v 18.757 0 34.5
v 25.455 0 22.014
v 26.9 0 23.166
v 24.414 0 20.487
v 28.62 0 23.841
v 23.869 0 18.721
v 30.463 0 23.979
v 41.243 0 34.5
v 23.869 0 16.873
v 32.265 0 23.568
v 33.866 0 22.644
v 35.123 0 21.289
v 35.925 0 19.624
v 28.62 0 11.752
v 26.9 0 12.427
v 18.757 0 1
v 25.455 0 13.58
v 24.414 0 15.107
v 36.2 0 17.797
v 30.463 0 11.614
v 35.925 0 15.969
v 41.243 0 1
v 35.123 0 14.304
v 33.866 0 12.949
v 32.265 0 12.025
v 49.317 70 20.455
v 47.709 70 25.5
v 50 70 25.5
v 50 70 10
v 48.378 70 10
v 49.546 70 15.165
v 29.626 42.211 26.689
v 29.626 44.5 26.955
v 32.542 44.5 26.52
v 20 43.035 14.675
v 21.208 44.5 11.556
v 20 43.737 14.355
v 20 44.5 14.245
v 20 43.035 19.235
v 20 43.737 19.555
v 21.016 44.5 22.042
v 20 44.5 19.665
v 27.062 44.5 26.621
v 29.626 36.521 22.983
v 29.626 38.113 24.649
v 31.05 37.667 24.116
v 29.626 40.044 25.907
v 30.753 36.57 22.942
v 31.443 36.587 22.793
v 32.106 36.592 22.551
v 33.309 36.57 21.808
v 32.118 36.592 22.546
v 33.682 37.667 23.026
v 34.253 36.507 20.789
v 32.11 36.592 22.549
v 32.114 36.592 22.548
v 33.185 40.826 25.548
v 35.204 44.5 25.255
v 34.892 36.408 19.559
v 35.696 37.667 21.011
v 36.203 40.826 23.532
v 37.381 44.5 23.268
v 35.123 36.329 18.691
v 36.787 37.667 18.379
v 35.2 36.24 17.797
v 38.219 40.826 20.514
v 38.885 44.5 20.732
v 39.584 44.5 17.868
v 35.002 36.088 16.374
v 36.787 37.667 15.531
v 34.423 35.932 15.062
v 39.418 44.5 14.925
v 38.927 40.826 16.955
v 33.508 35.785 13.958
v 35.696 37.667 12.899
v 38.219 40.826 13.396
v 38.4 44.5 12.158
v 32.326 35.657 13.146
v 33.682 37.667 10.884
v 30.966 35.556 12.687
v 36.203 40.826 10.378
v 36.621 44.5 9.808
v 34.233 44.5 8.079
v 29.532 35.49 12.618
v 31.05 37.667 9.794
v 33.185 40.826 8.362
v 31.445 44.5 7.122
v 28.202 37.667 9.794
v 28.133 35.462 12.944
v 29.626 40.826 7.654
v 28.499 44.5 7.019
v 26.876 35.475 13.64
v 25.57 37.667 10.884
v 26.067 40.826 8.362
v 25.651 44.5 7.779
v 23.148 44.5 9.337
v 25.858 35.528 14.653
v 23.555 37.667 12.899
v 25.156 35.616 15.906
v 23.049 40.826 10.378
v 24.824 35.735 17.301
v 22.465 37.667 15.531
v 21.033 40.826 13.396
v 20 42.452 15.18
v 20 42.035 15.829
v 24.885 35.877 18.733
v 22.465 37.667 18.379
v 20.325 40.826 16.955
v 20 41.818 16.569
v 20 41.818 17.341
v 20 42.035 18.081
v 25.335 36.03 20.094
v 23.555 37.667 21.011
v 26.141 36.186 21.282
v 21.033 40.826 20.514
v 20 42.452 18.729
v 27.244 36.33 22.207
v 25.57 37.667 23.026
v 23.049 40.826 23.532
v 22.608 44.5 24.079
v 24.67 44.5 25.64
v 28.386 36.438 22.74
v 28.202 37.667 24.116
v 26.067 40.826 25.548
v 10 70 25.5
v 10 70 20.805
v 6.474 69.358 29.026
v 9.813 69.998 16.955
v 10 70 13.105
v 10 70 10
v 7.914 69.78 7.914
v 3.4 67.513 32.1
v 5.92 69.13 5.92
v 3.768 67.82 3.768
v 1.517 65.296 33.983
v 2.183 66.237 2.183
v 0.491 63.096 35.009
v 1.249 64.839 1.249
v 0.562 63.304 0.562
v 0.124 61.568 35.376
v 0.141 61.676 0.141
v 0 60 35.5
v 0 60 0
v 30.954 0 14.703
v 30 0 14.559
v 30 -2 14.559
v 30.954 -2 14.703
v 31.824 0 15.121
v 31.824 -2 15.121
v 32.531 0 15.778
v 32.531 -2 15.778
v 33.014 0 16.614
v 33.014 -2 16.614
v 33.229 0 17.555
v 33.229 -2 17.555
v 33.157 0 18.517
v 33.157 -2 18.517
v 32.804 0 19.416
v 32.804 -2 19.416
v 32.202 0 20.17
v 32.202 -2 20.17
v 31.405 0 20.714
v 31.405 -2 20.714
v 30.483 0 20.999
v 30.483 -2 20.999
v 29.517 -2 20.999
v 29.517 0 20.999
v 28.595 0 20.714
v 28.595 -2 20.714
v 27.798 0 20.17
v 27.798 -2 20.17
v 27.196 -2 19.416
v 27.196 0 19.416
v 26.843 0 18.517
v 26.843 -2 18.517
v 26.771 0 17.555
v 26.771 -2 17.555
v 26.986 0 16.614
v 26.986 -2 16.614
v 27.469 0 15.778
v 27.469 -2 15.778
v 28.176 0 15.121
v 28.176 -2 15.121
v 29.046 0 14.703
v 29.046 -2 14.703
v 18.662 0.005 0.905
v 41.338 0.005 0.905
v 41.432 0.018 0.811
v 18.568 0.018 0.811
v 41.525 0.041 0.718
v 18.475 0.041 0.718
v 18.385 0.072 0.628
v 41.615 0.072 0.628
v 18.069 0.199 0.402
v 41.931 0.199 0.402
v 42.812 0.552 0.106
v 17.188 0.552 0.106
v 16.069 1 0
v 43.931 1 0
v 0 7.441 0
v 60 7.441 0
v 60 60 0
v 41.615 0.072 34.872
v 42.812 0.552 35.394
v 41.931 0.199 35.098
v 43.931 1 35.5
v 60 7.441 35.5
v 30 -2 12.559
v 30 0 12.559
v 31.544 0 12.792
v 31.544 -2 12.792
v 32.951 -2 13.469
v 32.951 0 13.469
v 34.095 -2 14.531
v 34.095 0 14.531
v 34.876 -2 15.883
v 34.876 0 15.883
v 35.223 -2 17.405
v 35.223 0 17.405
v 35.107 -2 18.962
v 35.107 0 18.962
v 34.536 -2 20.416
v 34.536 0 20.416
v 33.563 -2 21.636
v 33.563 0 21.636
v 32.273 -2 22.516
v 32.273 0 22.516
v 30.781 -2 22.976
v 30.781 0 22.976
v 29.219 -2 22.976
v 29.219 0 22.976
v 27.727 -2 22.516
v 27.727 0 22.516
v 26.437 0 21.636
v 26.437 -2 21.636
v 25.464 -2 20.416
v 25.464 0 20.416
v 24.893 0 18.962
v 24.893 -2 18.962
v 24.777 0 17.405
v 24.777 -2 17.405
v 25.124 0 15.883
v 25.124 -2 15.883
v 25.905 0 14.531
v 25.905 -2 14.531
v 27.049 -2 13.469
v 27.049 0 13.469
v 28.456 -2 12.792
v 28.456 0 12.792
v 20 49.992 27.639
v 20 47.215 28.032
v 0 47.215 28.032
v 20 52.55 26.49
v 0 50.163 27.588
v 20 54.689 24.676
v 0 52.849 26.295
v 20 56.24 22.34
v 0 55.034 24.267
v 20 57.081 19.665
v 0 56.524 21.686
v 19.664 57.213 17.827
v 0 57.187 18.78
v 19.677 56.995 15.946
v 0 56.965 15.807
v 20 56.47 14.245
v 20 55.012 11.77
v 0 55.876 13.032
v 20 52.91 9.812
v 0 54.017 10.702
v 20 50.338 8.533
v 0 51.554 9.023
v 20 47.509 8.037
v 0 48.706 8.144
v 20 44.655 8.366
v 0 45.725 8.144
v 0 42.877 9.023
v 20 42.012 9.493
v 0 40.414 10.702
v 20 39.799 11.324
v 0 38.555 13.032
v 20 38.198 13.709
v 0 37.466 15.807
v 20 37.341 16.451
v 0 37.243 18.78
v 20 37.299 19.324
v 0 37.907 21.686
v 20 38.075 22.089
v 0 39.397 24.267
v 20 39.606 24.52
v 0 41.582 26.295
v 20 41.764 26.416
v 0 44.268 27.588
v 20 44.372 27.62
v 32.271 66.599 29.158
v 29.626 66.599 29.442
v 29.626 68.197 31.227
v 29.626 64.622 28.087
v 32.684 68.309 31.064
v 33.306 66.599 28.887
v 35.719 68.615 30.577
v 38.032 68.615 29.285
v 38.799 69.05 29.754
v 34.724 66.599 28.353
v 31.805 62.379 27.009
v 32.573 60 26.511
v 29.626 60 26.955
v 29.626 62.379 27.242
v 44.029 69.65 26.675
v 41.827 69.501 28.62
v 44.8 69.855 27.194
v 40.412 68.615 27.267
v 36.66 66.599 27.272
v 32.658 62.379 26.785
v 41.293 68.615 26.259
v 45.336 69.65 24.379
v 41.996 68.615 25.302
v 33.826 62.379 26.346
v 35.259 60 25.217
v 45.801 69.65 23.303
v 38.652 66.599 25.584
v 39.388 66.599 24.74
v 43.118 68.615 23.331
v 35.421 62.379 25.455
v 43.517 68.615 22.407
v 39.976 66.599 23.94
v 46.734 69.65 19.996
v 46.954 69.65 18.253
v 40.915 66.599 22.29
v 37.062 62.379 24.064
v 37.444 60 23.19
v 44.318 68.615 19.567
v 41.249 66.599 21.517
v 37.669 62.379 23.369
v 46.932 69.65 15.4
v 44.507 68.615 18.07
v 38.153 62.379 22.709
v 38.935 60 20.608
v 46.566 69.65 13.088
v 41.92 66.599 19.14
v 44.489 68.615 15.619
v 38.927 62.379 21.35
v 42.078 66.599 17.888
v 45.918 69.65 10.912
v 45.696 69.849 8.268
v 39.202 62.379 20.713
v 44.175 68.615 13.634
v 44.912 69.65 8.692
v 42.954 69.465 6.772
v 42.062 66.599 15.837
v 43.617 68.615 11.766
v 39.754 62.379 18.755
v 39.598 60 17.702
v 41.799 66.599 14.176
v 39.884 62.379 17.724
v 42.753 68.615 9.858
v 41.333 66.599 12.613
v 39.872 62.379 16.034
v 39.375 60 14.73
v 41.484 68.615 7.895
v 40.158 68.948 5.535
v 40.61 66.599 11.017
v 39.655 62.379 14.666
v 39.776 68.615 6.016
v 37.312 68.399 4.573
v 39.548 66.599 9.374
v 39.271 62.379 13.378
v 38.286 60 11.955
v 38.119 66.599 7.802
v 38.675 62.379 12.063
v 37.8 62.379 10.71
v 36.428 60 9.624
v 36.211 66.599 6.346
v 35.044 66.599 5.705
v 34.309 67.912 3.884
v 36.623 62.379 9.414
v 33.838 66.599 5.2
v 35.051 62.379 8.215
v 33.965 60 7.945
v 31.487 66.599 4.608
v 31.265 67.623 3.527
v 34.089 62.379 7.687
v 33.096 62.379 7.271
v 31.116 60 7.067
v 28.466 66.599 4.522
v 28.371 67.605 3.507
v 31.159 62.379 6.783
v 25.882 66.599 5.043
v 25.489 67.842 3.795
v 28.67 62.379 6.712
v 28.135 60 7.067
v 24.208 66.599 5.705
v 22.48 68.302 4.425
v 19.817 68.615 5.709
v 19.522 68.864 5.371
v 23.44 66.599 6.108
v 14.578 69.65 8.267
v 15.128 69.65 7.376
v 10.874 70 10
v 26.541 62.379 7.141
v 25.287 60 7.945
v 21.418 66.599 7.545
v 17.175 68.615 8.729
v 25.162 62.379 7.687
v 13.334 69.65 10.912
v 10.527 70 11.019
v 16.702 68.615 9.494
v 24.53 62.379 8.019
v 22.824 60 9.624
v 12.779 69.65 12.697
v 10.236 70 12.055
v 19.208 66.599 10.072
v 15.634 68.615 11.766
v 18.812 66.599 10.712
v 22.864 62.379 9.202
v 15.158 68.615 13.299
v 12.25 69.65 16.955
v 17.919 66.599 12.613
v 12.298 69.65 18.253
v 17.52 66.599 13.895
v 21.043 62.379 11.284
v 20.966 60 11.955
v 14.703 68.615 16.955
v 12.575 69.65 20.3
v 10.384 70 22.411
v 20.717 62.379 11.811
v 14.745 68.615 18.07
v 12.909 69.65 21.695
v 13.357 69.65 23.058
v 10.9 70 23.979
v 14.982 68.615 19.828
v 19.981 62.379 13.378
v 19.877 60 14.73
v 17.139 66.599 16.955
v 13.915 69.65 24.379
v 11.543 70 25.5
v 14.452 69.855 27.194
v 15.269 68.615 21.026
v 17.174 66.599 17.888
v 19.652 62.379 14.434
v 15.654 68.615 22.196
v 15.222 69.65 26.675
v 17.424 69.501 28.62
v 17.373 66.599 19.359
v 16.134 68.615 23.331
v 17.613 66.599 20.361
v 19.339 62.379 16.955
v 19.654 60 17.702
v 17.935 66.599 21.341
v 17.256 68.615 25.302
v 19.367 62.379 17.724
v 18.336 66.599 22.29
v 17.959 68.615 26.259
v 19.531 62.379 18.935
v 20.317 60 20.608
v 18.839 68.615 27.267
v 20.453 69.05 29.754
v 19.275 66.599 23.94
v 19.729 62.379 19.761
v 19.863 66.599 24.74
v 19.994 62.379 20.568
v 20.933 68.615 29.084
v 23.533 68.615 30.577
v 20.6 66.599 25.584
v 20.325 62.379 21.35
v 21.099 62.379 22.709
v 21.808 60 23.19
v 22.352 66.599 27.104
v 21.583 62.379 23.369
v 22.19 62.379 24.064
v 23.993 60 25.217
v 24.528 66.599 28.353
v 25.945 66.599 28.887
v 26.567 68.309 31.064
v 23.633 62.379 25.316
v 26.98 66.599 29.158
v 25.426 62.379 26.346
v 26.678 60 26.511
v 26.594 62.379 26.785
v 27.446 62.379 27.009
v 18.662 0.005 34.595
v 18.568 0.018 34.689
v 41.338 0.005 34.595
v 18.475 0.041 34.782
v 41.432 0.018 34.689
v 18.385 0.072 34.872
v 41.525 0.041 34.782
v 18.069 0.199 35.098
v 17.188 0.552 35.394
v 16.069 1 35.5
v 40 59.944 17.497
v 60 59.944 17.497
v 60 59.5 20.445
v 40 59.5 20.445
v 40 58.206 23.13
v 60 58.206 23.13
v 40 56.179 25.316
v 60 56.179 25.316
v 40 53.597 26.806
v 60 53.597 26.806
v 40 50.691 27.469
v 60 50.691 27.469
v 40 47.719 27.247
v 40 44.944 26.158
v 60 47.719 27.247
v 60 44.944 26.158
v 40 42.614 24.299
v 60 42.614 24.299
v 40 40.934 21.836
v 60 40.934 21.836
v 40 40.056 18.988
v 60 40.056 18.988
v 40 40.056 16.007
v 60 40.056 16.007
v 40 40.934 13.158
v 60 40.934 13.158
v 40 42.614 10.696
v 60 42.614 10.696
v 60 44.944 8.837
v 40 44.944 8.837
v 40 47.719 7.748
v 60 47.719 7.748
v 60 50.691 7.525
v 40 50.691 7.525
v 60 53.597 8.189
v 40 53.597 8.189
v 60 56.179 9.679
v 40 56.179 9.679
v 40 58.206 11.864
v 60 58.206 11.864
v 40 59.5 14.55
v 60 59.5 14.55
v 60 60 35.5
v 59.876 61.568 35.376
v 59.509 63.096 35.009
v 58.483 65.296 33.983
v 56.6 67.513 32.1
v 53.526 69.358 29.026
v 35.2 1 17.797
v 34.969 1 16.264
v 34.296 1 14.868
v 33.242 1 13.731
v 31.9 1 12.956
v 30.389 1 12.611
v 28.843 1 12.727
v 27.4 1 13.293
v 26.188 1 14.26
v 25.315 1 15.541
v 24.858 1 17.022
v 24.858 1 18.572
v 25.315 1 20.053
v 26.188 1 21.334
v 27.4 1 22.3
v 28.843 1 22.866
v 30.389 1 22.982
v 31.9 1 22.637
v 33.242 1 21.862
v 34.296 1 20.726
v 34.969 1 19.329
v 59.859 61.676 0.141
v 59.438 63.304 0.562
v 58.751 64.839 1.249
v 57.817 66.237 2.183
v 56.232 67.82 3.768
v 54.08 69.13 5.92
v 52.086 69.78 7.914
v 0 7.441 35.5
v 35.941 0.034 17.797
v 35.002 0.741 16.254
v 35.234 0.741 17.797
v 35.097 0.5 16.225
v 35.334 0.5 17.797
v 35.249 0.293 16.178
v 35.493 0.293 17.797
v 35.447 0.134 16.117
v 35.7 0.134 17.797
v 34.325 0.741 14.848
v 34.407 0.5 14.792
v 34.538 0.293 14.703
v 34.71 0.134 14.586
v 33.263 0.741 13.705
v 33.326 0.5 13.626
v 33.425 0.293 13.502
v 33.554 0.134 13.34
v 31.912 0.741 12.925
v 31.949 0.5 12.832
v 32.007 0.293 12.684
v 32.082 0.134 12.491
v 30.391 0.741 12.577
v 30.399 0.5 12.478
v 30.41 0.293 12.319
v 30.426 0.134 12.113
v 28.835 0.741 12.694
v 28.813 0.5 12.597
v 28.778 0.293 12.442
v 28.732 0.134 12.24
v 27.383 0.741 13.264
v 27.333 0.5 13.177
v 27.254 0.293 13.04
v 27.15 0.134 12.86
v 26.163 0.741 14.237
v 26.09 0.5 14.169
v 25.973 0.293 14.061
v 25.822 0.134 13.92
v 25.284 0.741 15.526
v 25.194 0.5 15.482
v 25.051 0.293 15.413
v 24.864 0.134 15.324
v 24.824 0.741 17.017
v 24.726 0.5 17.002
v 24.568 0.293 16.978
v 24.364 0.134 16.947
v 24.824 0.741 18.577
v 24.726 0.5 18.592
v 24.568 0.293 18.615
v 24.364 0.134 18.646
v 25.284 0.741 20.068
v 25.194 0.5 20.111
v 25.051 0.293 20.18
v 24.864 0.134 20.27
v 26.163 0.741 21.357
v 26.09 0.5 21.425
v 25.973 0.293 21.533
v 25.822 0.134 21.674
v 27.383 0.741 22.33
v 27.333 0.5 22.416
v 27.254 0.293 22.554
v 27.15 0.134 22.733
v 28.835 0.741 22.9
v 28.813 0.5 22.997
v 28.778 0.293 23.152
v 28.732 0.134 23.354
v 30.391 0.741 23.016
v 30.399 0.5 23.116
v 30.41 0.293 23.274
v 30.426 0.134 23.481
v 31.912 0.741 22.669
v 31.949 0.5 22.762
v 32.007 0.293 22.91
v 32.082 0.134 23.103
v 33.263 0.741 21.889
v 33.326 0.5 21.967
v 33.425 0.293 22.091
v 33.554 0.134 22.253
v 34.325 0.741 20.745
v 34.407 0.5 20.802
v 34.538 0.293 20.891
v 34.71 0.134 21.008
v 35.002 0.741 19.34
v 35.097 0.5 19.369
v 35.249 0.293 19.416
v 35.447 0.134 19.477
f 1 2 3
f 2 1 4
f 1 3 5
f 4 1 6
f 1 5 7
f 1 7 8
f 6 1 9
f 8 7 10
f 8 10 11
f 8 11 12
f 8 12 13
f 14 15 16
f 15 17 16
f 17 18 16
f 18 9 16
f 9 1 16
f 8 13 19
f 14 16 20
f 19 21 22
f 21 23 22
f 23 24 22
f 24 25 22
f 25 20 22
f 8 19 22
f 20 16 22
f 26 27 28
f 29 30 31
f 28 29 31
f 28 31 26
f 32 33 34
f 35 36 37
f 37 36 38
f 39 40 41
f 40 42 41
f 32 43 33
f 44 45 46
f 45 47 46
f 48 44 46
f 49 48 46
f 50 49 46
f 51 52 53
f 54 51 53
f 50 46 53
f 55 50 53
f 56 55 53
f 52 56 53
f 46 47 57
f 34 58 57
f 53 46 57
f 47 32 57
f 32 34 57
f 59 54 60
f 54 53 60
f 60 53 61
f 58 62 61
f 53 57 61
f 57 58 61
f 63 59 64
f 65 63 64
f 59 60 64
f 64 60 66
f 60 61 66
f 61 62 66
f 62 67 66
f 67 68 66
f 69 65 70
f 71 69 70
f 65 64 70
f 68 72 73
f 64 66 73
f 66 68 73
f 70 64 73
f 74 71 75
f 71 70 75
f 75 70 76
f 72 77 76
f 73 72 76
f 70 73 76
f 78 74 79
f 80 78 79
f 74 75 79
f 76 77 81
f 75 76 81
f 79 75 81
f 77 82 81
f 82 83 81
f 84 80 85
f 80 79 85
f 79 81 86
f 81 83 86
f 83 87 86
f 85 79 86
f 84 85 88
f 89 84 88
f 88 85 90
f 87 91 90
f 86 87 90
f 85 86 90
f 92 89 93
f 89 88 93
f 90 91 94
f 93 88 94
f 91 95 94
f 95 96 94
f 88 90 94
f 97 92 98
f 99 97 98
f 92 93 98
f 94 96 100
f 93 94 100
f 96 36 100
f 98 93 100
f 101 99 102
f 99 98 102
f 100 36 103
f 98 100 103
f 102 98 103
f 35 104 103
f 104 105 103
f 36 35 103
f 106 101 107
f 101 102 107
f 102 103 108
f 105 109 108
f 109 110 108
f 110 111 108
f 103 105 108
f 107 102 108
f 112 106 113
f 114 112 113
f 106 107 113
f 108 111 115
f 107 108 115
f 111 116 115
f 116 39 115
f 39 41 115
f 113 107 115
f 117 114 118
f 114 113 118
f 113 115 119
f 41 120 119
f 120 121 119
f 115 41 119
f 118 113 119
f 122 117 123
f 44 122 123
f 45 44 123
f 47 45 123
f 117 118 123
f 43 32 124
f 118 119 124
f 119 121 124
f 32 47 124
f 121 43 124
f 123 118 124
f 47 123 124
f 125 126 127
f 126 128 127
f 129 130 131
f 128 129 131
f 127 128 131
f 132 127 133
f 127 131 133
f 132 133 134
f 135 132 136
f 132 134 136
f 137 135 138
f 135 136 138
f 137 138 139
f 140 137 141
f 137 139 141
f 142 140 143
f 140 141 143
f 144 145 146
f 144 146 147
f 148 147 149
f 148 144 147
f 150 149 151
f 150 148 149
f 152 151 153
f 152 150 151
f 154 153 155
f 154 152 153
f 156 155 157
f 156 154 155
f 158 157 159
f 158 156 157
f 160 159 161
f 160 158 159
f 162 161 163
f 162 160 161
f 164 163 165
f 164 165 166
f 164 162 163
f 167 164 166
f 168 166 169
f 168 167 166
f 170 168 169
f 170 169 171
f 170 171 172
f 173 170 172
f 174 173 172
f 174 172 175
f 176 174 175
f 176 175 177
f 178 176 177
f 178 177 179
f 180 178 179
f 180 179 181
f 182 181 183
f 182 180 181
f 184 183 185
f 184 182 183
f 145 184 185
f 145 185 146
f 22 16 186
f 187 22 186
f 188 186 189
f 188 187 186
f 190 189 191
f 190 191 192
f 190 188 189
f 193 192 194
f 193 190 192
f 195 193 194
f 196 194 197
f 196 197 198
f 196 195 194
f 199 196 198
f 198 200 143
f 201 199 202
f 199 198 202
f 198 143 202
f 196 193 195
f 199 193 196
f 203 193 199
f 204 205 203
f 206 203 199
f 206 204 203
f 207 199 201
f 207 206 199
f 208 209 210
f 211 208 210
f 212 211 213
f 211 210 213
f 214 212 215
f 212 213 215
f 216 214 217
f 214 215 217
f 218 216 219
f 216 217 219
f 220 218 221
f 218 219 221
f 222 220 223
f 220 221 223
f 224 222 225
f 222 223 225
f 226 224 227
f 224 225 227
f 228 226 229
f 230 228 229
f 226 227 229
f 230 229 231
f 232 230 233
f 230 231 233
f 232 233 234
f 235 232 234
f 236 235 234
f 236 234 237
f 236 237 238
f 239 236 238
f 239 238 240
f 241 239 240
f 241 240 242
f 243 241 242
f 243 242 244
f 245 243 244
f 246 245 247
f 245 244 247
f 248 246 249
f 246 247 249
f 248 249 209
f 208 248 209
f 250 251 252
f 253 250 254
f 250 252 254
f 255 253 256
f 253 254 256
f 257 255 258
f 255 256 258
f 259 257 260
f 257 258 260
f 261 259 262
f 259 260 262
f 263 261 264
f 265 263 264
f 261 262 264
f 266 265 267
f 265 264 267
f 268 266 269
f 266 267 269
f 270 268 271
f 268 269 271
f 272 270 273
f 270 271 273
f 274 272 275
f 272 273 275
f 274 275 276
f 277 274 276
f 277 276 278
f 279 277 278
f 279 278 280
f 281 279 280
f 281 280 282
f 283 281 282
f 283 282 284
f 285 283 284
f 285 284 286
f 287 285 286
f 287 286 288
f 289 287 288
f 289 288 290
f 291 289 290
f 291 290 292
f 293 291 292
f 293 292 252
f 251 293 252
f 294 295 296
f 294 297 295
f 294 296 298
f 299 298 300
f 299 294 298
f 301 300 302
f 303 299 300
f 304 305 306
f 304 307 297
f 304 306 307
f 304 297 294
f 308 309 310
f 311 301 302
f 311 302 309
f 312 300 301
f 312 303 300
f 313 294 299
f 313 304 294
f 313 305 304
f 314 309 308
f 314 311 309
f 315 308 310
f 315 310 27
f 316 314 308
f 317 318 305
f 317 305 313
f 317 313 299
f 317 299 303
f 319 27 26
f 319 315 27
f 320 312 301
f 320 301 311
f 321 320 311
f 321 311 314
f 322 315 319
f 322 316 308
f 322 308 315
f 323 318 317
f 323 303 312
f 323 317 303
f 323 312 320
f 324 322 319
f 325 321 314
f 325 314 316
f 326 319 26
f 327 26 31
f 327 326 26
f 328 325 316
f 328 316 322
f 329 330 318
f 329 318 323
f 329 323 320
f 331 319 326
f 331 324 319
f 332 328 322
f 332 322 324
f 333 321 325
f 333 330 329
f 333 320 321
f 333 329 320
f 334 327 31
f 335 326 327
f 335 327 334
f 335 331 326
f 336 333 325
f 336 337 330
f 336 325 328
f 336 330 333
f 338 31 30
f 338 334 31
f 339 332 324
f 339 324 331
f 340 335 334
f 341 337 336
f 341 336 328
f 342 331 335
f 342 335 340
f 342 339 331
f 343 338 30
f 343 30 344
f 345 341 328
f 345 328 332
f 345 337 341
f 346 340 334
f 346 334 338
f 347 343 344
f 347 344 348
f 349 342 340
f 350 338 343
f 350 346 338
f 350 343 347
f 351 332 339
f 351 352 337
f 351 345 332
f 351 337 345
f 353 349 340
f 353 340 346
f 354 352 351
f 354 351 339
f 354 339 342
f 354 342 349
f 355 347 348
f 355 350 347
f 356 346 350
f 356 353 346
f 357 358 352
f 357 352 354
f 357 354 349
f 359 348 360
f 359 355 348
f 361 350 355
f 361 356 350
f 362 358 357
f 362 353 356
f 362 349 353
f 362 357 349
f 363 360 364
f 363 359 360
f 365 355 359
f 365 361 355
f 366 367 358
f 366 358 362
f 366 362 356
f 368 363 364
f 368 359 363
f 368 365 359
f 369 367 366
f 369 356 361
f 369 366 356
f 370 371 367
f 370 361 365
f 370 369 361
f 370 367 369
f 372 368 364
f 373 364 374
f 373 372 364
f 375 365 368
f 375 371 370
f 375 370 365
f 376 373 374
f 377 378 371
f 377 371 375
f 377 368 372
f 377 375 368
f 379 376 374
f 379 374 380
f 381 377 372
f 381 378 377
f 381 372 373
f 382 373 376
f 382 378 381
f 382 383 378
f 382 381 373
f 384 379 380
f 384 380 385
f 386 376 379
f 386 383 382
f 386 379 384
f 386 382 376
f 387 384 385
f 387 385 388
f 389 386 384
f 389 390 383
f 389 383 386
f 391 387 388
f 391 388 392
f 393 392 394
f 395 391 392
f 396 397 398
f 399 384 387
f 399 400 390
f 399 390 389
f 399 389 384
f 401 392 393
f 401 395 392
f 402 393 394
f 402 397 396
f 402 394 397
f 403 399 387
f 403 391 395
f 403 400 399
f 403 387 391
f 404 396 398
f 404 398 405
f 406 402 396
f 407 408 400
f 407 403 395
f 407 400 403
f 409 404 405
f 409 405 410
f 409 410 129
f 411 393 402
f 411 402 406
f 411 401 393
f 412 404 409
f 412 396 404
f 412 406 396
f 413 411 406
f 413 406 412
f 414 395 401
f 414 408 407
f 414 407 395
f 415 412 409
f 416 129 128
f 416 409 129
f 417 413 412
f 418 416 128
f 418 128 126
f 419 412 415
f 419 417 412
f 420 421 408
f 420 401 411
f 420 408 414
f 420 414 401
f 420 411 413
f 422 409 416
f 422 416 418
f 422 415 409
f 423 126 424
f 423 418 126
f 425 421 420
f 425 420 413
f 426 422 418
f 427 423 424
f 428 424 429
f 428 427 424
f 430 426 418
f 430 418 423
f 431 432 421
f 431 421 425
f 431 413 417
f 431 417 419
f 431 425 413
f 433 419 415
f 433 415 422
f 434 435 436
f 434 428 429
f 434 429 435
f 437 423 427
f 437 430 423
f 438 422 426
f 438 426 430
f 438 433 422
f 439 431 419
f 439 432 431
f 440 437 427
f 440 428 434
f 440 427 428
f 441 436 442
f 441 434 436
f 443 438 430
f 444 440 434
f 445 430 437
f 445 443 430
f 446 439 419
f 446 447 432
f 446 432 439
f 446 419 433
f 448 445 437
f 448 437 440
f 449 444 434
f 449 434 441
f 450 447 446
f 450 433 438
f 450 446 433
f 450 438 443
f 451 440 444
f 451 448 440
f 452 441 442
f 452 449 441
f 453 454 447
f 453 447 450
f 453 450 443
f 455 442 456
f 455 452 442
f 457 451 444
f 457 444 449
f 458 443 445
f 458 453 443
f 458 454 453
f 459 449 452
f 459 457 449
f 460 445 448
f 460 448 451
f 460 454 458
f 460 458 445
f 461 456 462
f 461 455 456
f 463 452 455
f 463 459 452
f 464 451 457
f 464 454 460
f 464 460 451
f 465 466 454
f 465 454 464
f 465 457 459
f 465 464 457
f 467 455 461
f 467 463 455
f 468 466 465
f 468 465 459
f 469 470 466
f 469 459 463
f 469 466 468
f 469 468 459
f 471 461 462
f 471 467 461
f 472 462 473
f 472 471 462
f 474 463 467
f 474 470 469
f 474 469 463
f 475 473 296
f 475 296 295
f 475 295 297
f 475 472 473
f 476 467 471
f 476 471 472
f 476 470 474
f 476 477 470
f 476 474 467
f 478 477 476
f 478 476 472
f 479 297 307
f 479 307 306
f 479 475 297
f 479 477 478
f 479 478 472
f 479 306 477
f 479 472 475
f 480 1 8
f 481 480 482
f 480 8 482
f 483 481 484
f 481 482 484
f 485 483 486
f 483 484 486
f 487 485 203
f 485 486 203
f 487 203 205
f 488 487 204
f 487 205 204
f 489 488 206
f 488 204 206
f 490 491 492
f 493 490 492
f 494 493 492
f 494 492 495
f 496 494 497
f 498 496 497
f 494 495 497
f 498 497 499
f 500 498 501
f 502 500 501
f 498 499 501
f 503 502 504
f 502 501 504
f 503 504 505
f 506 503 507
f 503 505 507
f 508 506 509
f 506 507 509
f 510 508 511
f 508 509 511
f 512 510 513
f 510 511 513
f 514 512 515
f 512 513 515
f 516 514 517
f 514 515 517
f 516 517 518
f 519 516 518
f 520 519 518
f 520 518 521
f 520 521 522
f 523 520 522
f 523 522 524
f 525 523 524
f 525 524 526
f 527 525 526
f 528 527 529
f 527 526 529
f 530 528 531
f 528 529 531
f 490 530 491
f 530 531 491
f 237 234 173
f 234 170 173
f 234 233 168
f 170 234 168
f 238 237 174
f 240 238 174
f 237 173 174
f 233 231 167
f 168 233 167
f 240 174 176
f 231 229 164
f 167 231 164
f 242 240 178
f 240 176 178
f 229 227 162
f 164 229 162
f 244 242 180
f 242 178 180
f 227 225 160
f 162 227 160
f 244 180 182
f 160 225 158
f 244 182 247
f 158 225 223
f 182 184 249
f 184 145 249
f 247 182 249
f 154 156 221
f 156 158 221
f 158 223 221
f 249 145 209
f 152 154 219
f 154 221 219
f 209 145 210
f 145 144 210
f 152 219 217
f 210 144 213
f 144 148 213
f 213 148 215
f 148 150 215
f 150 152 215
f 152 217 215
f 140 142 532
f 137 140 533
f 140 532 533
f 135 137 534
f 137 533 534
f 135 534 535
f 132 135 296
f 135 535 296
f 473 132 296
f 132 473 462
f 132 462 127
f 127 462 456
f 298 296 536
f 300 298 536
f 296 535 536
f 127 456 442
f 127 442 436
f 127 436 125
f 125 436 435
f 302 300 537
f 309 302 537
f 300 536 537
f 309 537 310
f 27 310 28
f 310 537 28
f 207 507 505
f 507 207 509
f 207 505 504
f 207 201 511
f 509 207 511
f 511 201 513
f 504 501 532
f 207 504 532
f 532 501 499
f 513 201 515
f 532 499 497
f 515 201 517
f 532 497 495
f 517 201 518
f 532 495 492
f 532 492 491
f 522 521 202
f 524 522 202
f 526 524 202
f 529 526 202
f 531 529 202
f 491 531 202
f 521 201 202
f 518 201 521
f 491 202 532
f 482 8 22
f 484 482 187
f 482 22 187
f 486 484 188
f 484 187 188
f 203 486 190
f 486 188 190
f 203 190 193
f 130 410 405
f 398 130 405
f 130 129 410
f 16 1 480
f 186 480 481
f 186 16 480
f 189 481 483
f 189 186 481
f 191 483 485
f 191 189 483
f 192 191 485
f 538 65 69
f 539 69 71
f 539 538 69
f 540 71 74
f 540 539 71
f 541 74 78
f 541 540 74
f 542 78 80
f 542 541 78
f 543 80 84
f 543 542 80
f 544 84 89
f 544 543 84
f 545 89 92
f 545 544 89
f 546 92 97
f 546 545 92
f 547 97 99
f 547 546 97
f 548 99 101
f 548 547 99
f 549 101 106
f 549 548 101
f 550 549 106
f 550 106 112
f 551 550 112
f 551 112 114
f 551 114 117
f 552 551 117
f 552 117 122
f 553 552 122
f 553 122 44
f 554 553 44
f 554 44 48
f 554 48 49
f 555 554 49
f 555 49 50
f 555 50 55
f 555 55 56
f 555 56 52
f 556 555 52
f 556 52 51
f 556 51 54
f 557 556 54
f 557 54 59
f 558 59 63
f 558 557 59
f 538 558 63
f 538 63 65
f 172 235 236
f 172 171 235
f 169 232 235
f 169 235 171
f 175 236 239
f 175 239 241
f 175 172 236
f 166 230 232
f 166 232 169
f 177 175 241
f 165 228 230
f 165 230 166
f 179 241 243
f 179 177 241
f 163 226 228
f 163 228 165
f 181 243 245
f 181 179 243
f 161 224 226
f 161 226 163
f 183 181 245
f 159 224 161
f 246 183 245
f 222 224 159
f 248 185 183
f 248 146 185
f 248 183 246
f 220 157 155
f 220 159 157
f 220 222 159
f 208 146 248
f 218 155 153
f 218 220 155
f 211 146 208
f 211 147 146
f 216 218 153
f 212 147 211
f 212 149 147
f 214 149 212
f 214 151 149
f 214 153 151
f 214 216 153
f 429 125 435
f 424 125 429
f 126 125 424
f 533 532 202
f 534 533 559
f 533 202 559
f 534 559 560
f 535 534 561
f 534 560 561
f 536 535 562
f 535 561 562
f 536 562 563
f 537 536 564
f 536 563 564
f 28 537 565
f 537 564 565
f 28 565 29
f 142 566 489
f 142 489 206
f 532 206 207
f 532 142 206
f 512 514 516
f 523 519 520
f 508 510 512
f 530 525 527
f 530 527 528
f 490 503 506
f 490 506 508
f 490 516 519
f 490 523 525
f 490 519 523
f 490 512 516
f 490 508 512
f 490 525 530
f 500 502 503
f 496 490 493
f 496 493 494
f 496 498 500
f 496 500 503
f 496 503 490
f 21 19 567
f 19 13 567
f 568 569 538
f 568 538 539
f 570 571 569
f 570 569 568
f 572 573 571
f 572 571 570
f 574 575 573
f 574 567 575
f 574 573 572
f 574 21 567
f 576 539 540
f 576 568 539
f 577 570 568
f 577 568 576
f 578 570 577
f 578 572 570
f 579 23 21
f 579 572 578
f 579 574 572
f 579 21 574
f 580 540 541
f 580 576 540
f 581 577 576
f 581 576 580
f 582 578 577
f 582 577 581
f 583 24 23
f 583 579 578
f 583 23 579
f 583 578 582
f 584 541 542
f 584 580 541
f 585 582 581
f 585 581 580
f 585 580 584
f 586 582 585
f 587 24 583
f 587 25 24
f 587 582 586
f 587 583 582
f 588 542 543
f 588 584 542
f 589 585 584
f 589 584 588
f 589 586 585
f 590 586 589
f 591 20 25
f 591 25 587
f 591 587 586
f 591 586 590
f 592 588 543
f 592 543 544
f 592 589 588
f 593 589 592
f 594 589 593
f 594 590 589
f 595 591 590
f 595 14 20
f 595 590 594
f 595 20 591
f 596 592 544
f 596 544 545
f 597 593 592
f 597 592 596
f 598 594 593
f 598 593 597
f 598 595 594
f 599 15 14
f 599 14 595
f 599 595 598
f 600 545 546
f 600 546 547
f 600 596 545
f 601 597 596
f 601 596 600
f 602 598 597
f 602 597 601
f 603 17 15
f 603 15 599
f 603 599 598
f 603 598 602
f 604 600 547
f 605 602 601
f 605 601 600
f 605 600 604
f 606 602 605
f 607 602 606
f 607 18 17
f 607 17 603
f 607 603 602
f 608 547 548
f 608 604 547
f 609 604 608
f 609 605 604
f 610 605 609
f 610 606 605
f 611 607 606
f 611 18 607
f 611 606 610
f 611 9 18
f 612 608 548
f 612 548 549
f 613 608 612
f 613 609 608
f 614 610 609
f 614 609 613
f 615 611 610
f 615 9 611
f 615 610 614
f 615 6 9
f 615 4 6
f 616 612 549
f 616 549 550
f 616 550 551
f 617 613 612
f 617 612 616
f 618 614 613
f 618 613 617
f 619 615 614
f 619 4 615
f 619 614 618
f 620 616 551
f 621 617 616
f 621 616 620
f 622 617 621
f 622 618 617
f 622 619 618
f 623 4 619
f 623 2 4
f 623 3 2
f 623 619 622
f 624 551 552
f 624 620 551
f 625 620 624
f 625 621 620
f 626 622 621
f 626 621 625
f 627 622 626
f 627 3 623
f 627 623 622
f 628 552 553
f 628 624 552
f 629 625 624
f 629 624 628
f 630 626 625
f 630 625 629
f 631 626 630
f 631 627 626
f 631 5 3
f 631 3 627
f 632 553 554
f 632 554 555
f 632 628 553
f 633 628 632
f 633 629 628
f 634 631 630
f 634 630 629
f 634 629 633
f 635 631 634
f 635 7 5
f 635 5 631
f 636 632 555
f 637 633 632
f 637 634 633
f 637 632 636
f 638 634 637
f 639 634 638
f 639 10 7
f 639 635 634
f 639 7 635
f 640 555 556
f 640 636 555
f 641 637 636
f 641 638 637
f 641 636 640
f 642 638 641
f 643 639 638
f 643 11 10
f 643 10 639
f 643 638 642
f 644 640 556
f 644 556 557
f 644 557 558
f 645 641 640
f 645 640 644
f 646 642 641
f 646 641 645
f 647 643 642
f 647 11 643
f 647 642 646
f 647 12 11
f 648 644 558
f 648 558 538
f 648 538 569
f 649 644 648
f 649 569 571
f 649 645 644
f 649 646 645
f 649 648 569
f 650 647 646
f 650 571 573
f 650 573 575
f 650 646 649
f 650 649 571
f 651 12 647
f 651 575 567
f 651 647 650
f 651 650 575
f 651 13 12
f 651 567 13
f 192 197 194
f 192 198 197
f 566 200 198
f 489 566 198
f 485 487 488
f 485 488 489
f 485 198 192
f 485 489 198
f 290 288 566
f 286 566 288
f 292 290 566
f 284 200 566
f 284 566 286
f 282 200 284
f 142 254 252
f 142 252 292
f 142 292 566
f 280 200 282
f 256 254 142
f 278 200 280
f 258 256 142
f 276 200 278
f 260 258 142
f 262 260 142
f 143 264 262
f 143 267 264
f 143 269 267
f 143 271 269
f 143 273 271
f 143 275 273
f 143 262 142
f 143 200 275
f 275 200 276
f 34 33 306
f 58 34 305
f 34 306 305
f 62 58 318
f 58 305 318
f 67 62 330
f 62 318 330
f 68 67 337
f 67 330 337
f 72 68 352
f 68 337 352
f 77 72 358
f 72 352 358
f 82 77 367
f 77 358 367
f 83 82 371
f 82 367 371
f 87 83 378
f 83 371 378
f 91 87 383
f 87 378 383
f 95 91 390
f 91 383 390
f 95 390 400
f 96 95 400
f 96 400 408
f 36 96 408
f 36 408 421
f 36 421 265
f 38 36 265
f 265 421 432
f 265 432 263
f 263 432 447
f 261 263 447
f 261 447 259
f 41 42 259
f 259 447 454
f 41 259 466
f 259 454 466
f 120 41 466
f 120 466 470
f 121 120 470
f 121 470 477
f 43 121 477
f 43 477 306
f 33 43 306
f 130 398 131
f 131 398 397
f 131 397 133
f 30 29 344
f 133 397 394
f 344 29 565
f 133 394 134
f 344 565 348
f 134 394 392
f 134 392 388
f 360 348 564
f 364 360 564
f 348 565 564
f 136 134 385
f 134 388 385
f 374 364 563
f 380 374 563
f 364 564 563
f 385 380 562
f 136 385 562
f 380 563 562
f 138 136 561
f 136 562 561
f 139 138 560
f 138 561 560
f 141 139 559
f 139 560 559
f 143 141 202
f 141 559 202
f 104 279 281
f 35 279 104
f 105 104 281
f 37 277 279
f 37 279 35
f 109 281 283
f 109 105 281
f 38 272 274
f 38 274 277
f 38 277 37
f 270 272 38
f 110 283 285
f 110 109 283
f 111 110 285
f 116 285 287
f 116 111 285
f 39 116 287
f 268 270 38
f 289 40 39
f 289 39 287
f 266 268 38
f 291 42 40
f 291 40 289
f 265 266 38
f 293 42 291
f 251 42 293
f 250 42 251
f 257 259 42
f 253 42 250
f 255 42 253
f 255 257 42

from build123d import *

# Parameters (mm, degrees)
SKETCH1_W                                  = 60
SKETCH1_H                                  = 70
BOSS_EXTRUDE1_DEPTH                        = 35.5
SKETCH3_R                                  = 10
CUT_EXTRUDE1_DEPTH                         = 35.5
FILLET1_R                                  = 10
SKETCH6_R                                  = 10
CUT_EXTRUDE6_DEPTH                         = 20
SKETCH7_R                                  = 10
CUT_EXTRUDE7_DEPTH                         = 20
CUT_EXTRUDE_THIN4_DEPTH                    = 99.793977717
CSK_FOR_M5_FLAT_HEAD_MACHINE_SCREW1_OUTL_R = 5.2
CSK_FOR_M5_FLAT_HEAD_MACHINE_SCREW1_DEPTH  = 36.592353538
FILLET2_R                                  = 1
SKETCH14_R                                 = 5.237907484
SKETCH14_R_2                               = 3.237907484
BOSS_EXTRUDE2_DEPTH                        = 2


# Read off the part's stored shape, not the designer's step: CSK for M5 Flat Head Machine Screw1
with BuildPart() as part:
    # Sketch1 → Boss-Extrude1 (new body)
    with BuildSketch(Plane.XY):
        with Locations((30, 35)):
            Rectangle(SKETCH1_W, SKETCH1_H)
    extrude(amount=BOSS_EXTRUDE1_DEPTH)

    # Sketch3 → Cut-Extrude1 (cut)
    with BuildSketch(Plane(origin=(0, 70, 0), x_dir=(1, 0, 0), z_dir=(0, 1, 0))):
        with Locations(Location((29.625863751, -16.954960471, 0), (0, 0, 270))):
            Circle(SKETCH3_R)
    extrude(amount=-CUT_EXTRUDE1_DEPTH, mode=Mode.SUBTRACT)

    # Fillet1
    # the kernel refuses this fillet: 10 mm, written as the material it adds along each edge
    with BuildSketch(Plane(origin=(29.625863751, 34.5, 16.954960471), x_dir=(0, 0, 1), z_dir=(-1, 0, 0))) as fillet1_piece_1:
        with BuildLine():
            CenterArc((10 - FILLET1_R, FILLET1_R), FILLET1_R, 270, 90)
            Line((10 - FILLET1_R, 0), (10, 0))
            Line((10, 0), (10, FILLET1_R))
        make_face()
    revolve(axis=Axis((29.625863751, 34.5, 16.954960471), (0, 1, 0)))
    # the kernel refuses this fillet: 10 mm, written as the material it takes off along each edge
    with BuildSketch(Plane(origin=(85, 70, 35.5), x_dir=(0, -1, 0), z_dir=(-1, 0, 0))) as fillet1_2_piece_1:
        with BuildLine():
            CenterArc((FILLET1_R, -FILLET1_R), FILLET1_R, 90, 90)
            Line((0, -FILLET1_R), (0, 0))
            Line((0, 0), (FILLET1_R, 0))
        make_face()
    extrude(amount=110, mode=Mode.SUBTRACT)
    with BuildSketch(Plane(origin=(29.625863751, 70, 16.954960471), x_dir=(0, 0, 1), z_dir=(-1, 0, 0))) as fillet1_2_piece_2:
        with BuildLine():
            CenterArc((10 + FILLET1_R, -FILLET1_R), FILLET1_R, 90, 90)
            Line((10, -FILLET1_R), (10, 0))
            Line((10, 0), (10 + FILLET1_R, 0))
        make_face()
    revolve(axis=Axis((29.625863751, 70, 16.954960471), (0, 1, 0)), mode=Mode.SUBTRACT)
    with BuildSketch(Plane(origin=(85, 70, 0), x_dir=(0, -1, 0), z_dir=(-1, 0, 0))) as fillet1_2_piece_3:
        with BuildLine():
            CenterArc((FILLET1_R, FILLET1_R), FILLET1_R, 180, 90)
            Line((0, FILLET1_R), (0, 0))
            Line((0, 0), (FILLET1_R, 0))
        make_face()
    extrude(amount=110, mode=Mode.SUBTRACT)
    with BuildSketch(Plane(origin=(0, 70, -25), x_dir=(0, -1, 0), z_dir=(0, 0, 1))) as fillet1_2_piece_4:
        with BuildLine():
            CenterArc((FILLET1_R, FILLET1_R), FILLET1_R, 180, 90)
            Line((0, FILLET1_R), (0, 0))
            Line((0, 0), (FILLET1_R, 0))
        make_face()
    extrude(amount=85.5, mode=Mode.SUBTRACT)
    with BuildSketch(Plane(origin=(60, 70, -25), x_dir=(0, -1, 0), z_dir=(0, 0, 1))) as fillet1_2_piece_5:
        with BuildLine():
            CenterArc((FILLET1_R, -FILLET1_R), FILLET1_R, 90, 90)
            Line((0, -FILLET1_R), (0, 0))
            Line((0, 0), (FILLET1_R, 0))
        make_face()
    extrude(amount=85.5, mode=Mode.SUBTRACT)

    # Sketch6 → Cut-Extrude6 (cut)
    with BuildSketch(Plane(origin=(60, 0, 0), x_dir=(0, 0, -1), z_dir=(1, 0, 0))):
        with Locations(Location((-17.49726075, 49.944024106, 0), (0, 0, 90))):
            Circle(SKETCH6_R)
    extrude(amount=-CUT_EXTRUDE6_DEPTH, mode=Mode.SUBTRACT)

    # Sketch7 → Cut-Extrude7 (cut)
    with BuildSketch(Plane.ZY):
        with Locations((18.032436188, 47.215365125)):
            Circle(SKETCH7_R)
    extrude(amount=-CUT_EXTRUDE7_DEPTH, mode=Mode.SUBTRACT)

    # Sketch11 → Cut-Extrude-Thin4 (cut, through all)
    with BuildSketch(Plane.XY.offset(35.5)):
        Polygon((0, 7.440758534), (18.56435058, 0), (14.843971313, -9.28217529), (-3.720379267, -1.841416756), align=None)
        Polygon((41.43564942, 0), (60, 7.440758534), (63.720379267, -1.841416756), (45.156028687, -9.28217529), align=None)
    extrude(amount=-CUT_EXTRUDE_THIN4_DEPTH, mode=Mode.SUBTRACT)

    # CSK for M5 Flat Head Machine Screw1 outl → CSK for M5 Flat Head Machine Screw1 (cut)
    with BuildSketch(Plane(origin=(0, 0, 0), x_dir=(1, 0, 0), z_dir=(0, 1, 0))):
        with Locations((30, -17.796767031)):
            Circle(CSK_FOR_M5_FLAT_HEAD_MACHINE_SCREW1_OUTL_R)
    extrude(amount=CSK_FOR_M5_FLAT_HEAD_MACHINE_SCREW1_DEPTH, mode=Mode.SUBTRACT)

    # Fillet2
    fillet2_edges = [part.edges().sort_by_distance(p)[0] for p in [
        (30, 0, 0),
        (30, 0, 35.5),
        (18.56435058, 0, 17.75),
        (41.43564942, 0, 17.75),
        (24.8, 0, 17.796767031),
    ]]
    fillet(fillet2_edges, radius=FILLET2_R)


with BuildPart() as body_2:
    # Sketch14 → Boss-Extrude2 (new body)
    with BuildSketch(Plane.XZ):
        with Locations(Location((30, 17.796767031, 0), (0, 0, 270))):
            Circle(SKETCH14_R)
        with Locations(Location((30, 17.796767031, 0), (0, 0, 270))):
            Circle(SKETCH14_R_2, mode=Mode.SUBTRACT)
    extrude(amount=BOSS_EXTRUDE2_DEPTH)


solid = Compound([part.part, body_2.part])
